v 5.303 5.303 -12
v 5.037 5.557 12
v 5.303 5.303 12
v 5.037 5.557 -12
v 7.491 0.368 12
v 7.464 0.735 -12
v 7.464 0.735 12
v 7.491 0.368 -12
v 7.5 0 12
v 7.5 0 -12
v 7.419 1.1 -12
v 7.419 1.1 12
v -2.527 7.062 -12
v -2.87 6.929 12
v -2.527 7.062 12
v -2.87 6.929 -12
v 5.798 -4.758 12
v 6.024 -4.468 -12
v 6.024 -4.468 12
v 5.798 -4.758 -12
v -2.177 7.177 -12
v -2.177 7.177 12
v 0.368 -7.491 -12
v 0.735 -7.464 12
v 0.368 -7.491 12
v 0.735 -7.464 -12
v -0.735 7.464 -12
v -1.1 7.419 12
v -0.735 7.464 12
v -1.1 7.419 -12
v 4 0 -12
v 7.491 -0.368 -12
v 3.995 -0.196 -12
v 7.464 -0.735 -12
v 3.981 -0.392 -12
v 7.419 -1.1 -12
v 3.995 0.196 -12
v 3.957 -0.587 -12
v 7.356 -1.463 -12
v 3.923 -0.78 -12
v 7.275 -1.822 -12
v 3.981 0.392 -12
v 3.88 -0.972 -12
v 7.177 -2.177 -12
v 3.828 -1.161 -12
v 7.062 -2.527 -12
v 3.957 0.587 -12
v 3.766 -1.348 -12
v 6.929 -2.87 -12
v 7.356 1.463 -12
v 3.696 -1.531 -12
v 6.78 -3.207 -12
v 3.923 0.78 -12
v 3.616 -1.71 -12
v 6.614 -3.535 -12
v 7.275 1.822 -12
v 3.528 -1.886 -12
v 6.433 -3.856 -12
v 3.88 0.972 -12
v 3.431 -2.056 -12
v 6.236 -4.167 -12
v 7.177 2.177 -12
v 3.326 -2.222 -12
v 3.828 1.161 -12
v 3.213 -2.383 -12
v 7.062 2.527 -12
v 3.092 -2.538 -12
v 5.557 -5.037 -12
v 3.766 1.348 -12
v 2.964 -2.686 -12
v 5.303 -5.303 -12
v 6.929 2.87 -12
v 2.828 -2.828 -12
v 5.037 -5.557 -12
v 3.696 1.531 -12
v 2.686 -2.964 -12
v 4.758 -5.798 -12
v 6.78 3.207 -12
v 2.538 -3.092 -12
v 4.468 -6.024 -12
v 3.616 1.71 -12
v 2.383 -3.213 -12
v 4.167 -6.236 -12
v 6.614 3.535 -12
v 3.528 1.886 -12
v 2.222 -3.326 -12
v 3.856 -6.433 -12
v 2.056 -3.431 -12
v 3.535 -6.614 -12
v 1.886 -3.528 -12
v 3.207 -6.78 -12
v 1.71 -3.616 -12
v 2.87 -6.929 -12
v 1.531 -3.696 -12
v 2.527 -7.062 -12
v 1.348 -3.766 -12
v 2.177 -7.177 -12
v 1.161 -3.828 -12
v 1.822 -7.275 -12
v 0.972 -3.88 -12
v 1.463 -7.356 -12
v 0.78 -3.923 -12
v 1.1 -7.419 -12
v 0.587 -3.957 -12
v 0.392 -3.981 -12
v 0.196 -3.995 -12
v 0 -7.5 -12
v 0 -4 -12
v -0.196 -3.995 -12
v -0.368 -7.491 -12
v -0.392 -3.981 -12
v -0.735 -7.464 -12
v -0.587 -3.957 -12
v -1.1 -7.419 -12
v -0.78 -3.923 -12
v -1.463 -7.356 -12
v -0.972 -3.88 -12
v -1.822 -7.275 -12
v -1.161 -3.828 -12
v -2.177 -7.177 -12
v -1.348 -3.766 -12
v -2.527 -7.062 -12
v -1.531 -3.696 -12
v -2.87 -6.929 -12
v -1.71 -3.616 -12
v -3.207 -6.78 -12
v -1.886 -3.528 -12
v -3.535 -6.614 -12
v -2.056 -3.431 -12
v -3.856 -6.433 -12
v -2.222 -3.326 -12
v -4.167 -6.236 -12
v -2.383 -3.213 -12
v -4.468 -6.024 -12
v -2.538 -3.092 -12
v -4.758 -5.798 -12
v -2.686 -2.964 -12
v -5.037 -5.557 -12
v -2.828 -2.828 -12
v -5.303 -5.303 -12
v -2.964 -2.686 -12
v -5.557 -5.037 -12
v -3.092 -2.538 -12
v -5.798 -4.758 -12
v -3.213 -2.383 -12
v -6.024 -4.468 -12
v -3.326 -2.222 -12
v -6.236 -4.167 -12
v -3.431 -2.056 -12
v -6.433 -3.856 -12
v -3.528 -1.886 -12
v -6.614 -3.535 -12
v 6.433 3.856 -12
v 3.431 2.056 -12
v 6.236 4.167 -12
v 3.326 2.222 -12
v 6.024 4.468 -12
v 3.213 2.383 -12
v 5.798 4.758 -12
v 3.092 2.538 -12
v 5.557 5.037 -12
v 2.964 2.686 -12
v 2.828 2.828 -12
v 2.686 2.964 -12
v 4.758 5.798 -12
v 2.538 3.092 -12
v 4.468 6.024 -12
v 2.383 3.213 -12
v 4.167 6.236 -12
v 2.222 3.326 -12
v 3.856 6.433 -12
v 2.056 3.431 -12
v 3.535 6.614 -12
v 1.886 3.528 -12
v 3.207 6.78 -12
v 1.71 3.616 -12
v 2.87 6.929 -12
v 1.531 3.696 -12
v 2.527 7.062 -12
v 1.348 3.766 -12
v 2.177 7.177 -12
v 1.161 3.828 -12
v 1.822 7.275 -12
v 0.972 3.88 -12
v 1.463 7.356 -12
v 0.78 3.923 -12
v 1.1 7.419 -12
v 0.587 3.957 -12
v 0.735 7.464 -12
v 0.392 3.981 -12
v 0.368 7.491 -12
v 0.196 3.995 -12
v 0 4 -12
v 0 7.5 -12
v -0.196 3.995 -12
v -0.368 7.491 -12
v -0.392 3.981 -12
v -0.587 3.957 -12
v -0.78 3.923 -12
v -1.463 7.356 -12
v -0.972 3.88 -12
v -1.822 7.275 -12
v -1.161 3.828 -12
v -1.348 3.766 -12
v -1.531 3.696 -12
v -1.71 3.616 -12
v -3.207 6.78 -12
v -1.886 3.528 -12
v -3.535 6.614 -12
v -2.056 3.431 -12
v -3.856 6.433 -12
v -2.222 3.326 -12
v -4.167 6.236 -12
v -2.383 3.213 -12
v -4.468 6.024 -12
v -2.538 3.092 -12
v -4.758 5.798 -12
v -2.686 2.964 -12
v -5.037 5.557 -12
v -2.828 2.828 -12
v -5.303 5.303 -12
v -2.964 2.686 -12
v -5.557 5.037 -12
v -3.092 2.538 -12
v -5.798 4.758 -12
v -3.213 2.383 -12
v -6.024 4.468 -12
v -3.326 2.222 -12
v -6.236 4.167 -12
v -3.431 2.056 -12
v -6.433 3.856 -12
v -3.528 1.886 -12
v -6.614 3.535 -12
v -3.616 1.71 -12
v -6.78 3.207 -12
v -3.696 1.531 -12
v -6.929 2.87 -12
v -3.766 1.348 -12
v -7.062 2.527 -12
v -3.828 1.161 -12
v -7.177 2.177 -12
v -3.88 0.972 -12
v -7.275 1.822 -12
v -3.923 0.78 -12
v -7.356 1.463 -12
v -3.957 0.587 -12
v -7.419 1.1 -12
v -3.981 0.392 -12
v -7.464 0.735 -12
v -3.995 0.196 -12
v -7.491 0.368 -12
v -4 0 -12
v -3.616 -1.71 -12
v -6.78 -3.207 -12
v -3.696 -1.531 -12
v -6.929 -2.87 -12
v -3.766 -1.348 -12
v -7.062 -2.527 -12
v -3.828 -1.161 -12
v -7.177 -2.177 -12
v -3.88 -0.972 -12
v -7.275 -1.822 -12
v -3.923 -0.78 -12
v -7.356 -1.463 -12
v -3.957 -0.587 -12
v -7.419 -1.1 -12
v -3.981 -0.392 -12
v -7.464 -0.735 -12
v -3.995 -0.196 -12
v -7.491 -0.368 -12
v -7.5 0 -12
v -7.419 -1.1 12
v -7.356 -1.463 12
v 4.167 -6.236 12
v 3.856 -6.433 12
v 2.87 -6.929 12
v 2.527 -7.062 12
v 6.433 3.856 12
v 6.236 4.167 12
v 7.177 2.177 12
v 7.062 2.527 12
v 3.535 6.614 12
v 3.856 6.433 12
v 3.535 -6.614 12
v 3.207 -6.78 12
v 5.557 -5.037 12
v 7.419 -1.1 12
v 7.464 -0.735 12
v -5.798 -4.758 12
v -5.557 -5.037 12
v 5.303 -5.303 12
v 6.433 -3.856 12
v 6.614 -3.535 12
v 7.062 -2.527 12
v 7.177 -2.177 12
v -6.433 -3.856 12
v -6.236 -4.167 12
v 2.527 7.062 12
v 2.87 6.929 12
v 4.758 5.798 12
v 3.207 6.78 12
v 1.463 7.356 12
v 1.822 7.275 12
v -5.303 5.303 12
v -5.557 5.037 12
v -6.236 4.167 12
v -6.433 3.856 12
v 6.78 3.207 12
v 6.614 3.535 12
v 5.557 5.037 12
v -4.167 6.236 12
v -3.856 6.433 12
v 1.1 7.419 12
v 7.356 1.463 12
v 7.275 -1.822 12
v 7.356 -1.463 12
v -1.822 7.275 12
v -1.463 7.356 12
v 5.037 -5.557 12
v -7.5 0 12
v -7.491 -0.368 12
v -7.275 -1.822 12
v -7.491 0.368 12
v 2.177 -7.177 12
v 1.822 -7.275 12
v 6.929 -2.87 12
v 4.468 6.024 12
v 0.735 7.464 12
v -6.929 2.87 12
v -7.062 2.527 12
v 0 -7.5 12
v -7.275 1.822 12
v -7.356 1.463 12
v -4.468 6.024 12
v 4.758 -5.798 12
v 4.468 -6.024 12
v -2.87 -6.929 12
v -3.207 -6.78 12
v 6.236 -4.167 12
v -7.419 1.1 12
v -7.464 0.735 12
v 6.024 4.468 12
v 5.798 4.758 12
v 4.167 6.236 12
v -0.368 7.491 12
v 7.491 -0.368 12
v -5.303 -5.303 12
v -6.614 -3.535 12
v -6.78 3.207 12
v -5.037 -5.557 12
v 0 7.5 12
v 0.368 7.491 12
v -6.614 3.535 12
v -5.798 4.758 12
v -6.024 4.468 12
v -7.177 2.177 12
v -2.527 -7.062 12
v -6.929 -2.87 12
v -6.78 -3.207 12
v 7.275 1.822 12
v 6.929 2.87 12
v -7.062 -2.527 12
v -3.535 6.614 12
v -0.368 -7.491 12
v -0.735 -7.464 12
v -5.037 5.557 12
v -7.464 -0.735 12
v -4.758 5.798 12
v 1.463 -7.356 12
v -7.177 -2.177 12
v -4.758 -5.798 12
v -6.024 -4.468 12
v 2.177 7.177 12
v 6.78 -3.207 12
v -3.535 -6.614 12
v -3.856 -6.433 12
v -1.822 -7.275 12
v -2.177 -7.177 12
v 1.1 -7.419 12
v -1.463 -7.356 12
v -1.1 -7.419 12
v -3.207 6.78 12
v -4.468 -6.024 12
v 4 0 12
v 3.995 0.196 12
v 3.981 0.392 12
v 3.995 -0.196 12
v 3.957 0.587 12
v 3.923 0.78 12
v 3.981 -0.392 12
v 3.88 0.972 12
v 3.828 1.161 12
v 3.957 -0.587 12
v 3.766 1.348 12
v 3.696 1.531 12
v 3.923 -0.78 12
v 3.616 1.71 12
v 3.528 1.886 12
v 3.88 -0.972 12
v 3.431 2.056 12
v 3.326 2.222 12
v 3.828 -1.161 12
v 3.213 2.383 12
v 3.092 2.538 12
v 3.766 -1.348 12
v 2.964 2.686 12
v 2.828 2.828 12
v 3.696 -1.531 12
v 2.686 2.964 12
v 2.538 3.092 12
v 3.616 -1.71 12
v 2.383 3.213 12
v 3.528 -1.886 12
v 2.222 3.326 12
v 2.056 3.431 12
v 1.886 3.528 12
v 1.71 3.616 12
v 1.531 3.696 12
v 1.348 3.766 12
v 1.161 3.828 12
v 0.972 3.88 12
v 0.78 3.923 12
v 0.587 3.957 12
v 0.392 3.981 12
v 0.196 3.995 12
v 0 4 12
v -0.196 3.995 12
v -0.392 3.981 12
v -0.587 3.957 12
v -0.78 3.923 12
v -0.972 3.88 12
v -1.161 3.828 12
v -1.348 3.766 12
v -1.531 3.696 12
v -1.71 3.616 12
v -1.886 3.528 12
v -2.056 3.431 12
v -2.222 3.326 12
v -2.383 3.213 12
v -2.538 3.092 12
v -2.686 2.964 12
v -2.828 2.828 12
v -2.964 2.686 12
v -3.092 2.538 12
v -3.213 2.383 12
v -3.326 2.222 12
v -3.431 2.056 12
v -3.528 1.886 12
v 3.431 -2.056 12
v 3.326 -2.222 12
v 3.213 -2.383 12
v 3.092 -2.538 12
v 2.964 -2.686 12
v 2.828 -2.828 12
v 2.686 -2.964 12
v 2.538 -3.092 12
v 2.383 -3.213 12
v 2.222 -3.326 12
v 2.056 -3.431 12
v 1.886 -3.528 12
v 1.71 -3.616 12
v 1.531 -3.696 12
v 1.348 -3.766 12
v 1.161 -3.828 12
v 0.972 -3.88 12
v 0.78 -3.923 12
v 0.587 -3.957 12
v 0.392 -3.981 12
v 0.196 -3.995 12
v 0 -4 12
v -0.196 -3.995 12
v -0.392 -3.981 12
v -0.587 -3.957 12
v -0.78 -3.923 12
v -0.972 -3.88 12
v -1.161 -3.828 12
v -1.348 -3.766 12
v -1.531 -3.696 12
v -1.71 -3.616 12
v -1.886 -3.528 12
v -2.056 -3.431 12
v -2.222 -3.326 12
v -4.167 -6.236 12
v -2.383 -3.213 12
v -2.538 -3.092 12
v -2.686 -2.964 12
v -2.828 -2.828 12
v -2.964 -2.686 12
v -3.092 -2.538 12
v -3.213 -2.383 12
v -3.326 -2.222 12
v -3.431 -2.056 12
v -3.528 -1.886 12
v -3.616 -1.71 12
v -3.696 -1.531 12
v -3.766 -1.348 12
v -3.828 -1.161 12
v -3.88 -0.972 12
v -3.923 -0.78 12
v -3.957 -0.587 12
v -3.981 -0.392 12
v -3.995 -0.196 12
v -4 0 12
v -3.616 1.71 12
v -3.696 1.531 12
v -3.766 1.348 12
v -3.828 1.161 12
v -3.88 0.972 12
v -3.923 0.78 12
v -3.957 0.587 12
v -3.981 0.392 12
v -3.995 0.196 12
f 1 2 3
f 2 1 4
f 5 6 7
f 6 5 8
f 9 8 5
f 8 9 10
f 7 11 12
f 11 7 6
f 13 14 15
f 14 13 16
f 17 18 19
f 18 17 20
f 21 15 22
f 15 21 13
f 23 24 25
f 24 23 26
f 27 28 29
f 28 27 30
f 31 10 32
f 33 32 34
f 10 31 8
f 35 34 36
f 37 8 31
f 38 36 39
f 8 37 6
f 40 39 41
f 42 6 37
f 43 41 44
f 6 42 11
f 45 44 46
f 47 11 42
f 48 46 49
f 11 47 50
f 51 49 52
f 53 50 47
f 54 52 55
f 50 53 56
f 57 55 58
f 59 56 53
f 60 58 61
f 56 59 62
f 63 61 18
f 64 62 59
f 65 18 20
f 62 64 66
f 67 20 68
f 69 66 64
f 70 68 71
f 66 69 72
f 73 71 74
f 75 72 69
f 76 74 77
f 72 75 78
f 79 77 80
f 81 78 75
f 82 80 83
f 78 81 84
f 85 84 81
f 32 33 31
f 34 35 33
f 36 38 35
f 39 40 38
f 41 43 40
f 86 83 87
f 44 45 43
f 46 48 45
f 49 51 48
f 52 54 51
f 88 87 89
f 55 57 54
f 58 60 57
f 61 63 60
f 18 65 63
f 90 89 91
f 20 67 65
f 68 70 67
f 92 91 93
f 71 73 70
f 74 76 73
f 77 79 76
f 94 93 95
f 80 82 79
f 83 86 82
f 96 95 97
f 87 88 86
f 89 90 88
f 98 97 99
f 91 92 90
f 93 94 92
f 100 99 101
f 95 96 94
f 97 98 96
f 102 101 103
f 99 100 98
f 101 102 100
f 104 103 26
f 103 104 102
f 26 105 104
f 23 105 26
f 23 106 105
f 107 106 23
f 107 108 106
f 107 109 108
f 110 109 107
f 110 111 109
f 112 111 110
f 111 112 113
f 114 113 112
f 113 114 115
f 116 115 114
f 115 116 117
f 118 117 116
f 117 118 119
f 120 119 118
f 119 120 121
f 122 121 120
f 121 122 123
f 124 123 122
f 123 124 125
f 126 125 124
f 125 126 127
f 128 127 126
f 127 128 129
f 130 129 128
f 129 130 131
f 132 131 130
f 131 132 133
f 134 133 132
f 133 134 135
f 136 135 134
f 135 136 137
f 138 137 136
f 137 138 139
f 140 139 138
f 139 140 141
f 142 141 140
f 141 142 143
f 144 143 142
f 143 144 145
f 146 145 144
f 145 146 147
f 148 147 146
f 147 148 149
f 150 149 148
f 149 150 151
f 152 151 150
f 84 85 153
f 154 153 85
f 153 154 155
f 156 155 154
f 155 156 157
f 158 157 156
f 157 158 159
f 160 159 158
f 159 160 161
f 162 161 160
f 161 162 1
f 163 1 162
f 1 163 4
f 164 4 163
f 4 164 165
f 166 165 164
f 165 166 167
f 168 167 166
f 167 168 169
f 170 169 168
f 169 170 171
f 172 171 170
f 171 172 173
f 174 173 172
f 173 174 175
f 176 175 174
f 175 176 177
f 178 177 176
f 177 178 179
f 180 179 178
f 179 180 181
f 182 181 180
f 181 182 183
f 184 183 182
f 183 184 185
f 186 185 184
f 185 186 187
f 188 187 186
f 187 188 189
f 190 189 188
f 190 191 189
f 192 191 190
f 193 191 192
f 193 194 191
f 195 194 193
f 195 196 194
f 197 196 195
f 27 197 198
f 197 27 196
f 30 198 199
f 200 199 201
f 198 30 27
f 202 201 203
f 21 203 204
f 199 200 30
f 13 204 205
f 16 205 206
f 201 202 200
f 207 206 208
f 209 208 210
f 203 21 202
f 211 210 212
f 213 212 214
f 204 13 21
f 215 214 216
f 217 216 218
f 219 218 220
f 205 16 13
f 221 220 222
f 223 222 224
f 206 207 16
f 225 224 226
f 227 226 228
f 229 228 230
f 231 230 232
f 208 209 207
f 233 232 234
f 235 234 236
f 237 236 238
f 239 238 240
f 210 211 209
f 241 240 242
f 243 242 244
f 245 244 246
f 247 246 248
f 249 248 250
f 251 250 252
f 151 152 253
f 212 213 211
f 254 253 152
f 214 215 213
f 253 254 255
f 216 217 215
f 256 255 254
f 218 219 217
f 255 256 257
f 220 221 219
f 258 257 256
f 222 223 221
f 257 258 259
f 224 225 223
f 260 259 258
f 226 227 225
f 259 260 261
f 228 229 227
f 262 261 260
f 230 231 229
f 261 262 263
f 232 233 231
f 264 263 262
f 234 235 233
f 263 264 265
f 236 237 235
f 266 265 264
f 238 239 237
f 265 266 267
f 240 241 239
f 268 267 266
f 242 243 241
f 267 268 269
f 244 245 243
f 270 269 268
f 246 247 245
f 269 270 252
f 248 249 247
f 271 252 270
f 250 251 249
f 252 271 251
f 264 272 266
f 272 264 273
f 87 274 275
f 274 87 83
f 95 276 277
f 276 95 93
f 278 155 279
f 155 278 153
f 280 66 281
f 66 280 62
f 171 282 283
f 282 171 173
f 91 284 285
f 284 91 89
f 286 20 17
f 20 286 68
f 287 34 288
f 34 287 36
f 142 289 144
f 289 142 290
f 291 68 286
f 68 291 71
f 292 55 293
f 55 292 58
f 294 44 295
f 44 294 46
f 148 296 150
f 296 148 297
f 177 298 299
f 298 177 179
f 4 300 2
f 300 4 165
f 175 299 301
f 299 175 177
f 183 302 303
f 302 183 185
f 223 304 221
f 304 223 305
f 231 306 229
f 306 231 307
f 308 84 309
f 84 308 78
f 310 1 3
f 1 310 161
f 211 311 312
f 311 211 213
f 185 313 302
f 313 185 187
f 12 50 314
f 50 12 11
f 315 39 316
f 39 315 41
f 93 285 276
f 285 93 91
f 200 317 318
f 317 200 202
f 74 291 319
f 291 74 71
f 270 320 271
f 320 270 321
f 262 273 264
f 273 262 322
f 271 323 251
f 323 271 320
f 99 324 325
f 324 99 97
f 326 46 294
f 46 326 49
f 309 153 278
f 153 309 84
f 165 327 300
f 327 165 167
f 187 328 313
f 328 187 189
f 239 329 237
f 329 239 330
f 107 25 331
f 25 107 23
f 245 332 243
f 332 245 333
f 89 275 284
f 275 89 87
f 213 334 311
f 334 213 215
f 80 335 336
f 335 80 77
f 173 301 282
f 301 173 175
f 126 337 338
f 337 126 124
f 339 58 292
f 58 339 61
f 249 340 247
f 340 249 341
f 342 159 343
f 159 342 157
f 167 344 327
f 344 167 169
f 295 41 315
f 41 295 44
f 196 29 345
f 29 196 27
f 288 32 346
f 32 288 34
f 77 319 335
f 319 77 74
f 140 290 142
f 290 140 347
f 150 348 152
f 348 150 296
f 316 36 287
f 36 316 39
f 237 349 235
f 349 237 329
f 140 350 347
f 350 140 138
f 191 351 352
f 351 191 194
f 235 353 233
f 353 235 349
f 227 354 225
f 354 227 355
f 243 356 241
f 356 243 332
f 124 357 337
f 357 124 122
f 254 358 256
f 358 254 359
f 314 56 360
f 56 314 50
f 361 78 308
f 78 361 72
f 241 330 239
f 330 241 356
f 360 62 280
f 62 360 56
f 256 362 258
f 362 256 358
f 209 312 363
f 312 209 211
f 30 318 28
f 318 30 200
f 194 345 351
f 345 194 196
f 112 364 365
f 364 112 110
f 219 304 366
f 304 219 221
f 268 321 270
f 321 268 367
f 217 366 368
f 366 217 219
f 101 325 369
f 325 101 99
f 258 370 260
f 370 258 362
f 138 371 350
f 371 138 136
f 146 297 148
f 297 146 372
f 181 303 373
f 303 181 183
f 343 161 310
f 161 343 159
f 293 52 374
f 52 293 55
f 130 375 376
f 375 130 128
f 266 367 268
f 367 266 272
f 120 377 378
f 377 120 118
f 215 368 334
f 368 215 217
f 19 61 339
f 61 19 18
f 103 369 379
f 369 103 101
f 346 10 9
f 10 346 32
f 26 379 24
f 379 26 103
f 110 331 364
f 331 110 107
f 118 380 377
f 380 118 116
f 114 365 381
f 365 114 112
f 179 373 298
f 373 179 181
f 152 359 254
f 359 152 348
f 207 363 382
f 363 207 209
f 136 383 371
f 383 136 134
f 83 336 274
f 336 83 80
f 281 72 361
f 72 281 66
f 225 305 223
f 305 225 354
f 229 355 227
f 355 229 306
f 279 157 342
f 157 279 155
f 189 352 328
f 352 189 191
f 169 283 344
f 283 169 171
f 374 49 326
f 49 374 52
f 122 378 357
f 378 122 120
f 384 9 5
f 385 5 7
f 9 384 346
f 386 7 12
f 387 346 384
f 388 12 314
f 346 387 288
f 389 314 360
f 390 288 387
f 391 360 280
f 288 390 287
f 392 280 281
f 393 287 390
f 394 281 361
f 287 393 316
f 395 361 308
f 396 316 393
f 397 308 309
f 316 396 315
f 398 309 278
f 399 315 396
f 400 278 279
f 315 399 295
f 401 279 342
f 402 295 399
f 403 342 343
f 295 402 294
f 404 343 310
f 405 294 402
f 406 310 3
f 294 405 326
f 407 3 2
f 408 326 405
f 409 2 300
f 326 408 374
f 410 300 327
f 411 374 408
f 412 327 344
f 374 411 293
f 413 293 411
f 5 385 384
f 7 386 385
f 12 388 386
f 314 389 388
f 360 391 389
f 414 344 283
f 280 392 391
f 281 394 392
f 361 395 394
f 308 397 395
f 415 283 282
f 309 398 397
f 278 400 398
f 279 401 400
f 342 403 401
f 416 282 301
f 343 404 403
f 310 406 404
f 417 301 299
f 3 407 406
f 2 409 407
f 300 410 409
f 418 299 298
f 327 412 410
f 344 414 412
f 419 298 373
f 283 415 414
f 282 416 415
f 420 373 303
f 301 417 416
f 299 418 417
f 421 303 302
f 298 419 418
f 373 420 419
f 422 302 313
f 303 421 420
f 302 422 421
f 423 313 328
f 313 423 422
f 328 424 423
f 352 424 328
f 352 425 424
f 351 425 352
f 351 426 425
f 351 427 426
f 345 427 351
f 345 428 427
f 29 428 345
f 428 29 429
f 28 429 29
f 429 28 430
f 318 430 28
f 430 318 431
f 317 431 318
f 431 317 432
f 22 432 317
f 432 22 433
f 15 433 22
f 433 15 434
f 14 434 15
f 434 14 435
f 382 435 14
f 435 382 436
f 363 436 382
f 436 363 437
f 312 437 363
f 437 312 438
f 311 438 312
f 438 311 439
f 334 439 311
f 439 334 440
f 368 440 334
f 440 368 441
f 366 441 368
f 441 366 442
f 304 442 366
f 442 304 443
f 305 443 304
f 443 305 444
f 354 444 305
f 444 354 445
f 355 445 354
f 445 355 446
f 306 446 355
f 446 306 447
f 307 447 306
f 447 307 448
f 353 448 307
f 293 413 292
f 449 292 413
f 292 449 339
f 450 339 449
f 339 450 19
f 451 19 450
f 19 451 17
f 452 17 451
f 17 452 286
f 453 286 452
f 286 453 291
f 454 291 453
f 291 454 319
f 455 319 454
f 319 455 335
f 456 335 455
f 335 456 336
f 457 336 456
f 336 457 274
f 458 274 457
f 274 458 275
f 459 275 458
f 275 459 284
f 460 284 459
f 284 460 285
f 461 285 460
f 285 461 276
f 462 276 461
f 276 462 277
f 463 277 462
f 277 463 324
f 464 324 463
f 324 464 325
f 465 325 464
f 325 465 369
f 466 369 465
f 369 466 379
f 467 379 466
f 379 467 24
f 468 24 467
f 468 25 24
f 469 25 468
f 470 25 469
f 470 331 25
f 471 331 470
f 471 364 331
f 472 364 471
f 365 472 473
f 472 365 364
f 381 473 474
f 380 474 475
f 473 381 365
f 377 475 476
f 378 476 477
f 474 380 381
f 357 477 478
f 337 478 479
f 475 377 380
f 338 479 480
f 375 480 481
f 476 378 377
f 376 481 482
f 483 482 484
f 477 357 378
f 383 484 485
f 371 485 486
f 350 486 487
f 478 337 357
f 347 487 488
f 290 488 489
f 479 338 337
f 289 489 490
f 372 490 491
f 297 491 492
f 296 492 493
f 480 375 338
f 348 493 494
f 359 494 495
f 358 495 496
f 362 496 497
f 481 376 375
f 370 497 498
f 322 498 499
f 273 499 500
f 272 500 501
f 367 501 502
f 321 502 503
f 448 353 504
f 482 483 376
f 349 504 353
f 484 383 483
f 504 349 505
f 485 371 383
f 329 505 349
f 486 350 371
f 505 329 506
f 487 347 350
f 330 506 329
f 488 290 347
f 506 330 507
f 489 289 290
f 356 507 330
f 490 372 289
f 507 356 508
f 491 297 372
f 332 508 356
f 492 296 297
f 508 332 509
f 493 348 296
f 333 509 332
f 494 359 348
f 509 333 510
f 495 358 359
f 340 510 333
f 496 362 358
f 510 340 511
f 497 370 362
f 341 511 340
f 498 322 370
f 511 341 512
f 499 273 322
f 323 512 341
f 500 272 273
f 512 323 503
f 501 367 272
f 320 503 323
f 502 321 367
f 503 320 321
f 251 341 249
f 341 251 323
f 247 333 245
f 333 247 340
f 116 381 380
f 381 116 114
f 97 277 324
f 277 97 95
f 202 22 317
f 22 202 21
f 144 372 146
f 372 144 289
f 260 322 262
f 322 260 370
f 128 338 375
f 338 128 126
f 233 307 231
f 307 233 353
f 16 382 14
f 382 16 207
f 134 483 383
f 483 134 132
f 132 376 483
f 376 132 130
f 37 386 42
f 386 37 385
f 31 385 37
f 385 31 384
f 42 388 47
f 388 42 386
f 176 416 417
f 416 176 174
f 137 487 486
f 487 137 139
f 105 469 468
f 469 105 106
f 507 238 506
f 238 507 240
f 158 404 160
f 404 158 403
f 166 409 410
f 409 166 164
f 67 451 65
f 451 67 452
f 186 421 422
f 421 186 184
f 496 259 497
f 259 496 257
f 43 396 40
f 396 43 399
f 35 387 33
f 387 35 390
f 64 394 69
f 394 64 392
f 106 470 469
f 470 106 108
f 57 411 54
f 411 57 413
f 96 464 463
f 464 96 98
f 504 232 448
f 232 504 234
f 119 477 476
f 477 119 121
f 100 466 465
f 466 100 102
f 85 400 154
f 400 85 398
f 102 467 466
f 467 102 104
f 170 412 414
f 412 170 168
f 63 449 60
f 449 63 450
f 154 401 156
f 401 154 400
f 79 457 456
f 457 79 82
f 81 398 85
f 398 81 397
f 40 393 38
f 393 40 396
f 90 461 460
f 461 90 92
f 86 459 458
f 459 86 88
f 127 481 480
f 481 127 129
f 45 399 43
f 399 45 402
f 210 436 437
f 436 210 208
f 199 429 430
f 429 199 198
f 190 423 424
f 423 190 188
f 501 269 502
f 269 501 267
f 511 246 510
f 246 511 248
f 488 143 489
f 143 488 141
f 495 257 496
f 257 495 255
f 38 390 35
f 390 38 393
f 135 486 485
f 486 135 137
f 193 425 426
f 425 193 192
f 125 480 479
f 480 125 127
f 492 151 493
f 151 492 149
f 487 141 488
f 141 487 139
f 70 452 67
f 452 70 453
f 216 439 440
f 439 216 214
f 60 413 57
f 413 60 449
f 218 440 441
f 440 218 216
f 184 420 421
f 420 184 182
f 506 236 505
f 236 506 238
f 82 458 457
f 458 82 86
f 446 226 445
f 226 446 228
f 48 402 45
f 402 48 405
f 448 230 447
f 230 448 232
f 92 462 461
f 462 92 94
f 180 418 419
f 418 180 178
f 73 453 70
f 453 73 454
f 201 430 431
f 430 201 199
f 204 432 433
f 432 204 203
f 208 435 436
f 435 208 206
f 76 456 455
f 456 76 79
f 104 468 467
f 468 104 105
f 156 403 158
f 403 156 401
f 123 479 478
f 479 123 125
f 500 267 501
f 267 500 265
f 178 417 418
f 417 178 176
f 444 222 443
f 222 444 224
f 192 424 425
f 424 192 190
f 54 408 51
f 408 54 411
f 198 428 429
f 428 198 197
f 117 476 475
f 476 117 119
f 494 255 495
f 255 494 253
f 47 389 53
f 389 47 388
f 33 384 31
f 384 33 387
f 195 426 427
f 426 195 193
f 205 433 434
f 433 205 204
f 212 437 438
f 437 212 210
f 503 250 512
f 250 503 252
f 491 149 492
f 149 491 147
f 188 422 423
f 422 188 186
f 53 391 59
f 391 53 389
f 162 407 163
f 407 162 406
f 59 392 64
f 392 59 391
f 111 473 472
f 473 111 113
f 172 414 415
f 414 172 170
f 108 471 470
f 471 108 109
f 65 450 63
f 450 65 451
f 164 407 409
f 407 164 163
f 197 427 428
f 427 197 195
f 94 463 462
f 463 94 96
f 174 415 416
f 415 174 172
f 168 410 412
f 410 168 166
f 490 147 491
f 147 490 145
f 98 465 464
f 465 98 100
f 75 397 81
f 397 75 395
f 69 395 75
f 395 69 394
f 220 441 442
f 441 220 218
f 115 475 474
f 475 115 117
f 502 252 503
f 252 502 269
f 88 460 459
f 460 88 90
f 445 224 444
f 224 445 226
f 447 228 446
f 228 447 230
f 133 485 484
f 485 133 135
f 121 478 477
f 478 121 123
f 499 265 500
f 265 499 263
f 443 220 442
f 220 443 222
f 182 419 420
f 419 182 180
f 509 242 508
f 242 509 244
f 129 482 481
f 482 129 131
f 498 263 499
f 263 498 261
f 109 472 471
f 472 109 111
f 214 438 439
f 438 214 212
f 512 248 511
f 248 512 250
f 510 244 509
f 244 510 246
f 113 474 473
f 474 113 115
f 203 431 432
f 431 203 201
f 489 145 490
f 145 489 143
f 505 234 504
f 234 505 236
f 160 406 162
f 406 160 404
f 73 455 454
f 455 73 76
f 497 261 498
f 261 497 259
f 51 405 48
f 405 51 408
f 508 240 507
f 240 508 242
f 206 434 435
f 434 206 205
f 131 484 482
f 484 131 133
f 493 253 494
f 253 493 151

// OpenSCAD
$fn=128;

bore_d = 8.0;
od_d = 15.0;
len = 24.0;

module linear_bearing(bore_d, od_d, len) {
    difference() {
        cylinder(d=od_d, h=len, center=true);
        cylinder(d=bore_d, h=len+0.2, center=true);
    }
}

linear_bearing(bore_d, od_d, len);
